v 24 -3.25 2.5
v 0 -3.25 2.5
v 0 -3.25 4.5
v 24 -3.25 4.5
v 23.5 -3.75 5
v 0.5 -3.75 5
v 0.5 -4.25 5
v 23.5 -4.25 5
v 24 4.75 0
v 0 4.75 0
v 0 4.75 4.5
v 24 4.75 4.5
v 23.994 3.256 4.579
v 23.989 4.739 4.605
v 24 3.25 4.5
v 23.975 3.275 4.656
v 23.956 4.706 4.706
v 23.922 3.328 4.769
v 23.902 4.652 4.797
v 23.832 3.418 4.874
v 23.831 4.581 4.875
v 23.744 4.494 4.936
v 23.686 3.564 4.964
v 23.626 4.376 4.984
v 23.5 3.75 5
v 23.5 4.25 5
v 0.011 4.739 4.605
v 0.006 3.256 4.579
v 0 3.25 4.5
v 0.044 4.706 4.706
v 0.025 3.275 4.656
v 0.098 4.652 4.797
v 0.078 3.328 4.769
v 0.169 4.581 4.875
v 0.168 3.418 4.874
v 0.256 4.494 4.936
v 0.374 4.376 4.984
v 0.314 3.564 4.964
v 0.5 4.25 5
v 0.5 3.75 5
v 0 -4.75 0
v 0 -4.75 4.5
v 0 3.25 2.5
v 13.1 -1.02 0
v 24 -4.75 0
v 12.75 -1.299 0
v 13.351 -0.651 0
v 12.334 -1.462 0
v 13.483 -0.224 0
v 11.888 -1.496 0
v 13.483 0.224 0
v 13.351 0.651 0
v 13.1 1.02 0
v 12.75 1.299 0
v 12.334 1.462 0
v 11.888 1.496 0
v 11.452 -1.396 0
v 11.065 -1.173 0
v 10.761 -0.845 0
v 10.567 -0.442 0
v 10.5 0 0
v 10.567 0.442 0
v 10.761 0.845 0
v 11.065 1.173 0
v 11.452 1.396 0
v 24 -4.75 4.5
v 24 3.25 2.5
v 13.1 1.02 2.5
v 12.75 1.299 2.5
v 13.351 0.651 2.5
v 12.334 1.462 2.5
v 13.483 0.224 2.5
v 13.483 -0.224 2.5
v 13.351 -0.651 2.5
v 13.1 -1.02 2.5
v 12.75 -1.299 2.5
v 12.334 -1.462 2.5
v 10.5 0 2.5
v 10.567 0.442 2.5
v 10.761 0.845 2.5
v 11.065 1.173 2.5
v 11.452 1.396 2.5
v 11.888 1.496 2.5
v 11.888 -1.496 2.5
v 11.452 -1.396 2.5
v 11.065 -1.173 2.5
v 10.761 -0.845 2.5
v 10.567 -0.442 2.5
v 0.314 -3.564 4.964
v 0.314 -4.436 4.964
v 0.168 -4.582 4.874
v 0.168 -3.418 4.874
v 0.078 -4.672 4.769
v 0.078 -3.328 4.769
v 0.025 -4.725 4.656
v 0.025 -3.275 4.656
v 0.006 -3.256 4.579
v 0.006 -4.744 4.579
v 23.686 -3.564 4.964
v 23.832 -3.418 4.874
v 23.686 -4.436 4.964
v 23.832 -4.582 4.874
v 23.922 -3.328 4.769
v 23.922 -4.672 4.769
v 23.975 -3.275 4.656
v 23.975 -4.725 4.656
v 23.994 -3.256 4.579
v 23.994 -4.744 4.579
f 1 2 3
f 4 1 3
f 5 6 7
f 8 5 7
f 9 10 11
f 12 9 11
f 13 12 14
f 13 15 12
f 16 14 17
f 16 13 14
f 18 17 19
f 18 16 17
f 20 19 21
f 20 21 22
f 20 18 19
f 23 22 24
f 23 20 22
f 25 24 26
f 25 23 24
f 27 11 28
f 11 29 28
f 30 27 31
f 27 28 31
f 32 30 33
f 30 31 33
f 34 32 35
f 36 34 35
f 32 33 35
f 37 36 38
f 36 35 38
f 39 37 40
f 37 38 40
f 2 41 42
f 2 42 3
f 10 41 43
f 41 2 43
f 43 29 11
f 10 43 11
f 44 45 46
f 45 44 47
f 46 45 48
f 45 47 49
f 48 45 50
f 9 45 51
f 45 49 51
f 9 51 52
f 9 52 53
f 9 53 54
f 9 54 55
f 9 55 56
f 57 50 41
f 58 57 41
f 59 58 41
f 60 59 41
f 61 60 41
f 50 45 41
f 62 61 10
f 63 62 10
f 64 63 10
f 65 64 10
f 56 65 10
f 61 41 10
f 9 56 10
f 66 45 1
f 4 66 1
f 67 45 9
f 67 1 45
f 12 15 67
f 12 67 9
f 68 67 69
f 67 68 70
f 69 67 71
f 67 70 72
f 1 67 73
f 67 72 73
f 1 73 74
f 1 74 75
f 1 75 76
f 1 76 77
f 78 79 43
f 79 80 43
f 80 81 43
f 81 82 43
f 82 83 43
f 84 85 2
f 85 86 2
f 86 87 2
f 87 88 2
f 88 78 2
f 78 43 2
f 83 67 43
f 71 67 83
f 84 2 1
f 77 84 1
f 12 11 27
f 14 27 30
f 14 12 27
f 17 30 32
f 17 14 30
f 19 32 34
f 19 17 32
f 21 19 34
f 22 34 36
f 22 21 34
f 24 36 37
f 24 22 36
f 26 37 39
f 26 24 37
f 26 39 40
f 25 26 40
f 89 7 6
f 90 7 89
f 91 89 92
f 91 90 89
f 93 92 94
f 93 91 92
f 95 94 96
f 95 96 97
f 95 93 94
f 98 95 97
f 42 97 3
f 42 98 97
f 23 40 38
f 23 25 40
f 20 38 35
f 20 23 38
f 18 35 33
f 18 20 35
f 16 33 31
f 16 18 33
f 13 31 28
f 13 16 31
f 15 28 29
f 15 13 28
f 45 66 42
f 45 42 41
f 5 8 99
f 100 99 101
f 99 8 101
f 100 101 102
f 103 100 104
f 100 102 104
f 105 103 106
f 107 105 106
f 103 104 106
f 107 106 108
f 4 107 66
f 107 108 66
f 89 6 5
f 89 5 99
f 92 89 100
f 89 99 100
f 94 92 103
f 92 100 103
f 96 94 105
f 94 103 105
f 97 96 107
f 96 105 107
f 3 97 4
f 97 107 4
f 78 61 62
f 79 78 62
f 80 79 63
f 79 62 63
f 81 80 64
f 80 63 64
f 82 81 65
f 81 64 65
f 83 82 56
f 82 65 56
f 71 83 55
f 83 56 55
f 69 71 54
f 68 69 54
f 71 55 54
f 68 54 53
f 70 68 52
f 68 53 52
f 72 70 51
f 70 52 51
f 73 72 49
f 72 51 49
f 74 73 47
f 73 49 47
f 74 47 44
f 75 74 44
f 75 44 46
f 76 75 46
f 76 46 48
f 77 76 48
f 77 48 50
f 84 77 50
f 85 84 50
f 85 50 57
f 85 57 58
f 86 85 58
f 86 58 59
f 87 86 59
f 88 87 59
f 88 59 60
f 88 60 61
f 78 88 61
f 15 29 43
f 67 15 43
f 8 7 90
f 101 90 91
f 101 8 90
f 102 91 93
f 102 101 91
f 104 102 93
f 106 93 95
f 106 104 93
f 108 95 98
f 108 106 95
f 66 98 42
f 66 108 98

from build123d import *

# Parameters (mm, degrees)
F1_DEPTH = 24
F3_D     = 3
F4_R     = 0.5


with BuildPart() as f1:
    # F0 (on Right) → F1 (new body)
    with BuildSketch(Plane.YZ):
        Polygon((-3.25, 5), (-4.75, 5), (-4.75, 0), (4.75, 0), (4.75, 5), (3.25, 5), (3.25, 2.5), (-3.25, 2.5), align=None)
    extrude(amount=F1_DEPTH)

    # F3 (through all)
    with Locations(Plane.XY.offset(2.5)):
        with Locations((12, 0)):
            Hole(F3_D / 2)

    # F4
    f4_edges = [f1.edges().sort_by_distance(p)[0] for p in [
        (12, 3.25, 5),
        (12, -3.25, 5),
        (12, -4.75, 5),
        (12, 4.75, 5),
        (0, 4, 5),
        (0, -4, 5),
        (24, -4, 5),
        (24, 4, 5),
    ]]
    fillet(f4_edges, radius=F4_R)


solid = f1.part
